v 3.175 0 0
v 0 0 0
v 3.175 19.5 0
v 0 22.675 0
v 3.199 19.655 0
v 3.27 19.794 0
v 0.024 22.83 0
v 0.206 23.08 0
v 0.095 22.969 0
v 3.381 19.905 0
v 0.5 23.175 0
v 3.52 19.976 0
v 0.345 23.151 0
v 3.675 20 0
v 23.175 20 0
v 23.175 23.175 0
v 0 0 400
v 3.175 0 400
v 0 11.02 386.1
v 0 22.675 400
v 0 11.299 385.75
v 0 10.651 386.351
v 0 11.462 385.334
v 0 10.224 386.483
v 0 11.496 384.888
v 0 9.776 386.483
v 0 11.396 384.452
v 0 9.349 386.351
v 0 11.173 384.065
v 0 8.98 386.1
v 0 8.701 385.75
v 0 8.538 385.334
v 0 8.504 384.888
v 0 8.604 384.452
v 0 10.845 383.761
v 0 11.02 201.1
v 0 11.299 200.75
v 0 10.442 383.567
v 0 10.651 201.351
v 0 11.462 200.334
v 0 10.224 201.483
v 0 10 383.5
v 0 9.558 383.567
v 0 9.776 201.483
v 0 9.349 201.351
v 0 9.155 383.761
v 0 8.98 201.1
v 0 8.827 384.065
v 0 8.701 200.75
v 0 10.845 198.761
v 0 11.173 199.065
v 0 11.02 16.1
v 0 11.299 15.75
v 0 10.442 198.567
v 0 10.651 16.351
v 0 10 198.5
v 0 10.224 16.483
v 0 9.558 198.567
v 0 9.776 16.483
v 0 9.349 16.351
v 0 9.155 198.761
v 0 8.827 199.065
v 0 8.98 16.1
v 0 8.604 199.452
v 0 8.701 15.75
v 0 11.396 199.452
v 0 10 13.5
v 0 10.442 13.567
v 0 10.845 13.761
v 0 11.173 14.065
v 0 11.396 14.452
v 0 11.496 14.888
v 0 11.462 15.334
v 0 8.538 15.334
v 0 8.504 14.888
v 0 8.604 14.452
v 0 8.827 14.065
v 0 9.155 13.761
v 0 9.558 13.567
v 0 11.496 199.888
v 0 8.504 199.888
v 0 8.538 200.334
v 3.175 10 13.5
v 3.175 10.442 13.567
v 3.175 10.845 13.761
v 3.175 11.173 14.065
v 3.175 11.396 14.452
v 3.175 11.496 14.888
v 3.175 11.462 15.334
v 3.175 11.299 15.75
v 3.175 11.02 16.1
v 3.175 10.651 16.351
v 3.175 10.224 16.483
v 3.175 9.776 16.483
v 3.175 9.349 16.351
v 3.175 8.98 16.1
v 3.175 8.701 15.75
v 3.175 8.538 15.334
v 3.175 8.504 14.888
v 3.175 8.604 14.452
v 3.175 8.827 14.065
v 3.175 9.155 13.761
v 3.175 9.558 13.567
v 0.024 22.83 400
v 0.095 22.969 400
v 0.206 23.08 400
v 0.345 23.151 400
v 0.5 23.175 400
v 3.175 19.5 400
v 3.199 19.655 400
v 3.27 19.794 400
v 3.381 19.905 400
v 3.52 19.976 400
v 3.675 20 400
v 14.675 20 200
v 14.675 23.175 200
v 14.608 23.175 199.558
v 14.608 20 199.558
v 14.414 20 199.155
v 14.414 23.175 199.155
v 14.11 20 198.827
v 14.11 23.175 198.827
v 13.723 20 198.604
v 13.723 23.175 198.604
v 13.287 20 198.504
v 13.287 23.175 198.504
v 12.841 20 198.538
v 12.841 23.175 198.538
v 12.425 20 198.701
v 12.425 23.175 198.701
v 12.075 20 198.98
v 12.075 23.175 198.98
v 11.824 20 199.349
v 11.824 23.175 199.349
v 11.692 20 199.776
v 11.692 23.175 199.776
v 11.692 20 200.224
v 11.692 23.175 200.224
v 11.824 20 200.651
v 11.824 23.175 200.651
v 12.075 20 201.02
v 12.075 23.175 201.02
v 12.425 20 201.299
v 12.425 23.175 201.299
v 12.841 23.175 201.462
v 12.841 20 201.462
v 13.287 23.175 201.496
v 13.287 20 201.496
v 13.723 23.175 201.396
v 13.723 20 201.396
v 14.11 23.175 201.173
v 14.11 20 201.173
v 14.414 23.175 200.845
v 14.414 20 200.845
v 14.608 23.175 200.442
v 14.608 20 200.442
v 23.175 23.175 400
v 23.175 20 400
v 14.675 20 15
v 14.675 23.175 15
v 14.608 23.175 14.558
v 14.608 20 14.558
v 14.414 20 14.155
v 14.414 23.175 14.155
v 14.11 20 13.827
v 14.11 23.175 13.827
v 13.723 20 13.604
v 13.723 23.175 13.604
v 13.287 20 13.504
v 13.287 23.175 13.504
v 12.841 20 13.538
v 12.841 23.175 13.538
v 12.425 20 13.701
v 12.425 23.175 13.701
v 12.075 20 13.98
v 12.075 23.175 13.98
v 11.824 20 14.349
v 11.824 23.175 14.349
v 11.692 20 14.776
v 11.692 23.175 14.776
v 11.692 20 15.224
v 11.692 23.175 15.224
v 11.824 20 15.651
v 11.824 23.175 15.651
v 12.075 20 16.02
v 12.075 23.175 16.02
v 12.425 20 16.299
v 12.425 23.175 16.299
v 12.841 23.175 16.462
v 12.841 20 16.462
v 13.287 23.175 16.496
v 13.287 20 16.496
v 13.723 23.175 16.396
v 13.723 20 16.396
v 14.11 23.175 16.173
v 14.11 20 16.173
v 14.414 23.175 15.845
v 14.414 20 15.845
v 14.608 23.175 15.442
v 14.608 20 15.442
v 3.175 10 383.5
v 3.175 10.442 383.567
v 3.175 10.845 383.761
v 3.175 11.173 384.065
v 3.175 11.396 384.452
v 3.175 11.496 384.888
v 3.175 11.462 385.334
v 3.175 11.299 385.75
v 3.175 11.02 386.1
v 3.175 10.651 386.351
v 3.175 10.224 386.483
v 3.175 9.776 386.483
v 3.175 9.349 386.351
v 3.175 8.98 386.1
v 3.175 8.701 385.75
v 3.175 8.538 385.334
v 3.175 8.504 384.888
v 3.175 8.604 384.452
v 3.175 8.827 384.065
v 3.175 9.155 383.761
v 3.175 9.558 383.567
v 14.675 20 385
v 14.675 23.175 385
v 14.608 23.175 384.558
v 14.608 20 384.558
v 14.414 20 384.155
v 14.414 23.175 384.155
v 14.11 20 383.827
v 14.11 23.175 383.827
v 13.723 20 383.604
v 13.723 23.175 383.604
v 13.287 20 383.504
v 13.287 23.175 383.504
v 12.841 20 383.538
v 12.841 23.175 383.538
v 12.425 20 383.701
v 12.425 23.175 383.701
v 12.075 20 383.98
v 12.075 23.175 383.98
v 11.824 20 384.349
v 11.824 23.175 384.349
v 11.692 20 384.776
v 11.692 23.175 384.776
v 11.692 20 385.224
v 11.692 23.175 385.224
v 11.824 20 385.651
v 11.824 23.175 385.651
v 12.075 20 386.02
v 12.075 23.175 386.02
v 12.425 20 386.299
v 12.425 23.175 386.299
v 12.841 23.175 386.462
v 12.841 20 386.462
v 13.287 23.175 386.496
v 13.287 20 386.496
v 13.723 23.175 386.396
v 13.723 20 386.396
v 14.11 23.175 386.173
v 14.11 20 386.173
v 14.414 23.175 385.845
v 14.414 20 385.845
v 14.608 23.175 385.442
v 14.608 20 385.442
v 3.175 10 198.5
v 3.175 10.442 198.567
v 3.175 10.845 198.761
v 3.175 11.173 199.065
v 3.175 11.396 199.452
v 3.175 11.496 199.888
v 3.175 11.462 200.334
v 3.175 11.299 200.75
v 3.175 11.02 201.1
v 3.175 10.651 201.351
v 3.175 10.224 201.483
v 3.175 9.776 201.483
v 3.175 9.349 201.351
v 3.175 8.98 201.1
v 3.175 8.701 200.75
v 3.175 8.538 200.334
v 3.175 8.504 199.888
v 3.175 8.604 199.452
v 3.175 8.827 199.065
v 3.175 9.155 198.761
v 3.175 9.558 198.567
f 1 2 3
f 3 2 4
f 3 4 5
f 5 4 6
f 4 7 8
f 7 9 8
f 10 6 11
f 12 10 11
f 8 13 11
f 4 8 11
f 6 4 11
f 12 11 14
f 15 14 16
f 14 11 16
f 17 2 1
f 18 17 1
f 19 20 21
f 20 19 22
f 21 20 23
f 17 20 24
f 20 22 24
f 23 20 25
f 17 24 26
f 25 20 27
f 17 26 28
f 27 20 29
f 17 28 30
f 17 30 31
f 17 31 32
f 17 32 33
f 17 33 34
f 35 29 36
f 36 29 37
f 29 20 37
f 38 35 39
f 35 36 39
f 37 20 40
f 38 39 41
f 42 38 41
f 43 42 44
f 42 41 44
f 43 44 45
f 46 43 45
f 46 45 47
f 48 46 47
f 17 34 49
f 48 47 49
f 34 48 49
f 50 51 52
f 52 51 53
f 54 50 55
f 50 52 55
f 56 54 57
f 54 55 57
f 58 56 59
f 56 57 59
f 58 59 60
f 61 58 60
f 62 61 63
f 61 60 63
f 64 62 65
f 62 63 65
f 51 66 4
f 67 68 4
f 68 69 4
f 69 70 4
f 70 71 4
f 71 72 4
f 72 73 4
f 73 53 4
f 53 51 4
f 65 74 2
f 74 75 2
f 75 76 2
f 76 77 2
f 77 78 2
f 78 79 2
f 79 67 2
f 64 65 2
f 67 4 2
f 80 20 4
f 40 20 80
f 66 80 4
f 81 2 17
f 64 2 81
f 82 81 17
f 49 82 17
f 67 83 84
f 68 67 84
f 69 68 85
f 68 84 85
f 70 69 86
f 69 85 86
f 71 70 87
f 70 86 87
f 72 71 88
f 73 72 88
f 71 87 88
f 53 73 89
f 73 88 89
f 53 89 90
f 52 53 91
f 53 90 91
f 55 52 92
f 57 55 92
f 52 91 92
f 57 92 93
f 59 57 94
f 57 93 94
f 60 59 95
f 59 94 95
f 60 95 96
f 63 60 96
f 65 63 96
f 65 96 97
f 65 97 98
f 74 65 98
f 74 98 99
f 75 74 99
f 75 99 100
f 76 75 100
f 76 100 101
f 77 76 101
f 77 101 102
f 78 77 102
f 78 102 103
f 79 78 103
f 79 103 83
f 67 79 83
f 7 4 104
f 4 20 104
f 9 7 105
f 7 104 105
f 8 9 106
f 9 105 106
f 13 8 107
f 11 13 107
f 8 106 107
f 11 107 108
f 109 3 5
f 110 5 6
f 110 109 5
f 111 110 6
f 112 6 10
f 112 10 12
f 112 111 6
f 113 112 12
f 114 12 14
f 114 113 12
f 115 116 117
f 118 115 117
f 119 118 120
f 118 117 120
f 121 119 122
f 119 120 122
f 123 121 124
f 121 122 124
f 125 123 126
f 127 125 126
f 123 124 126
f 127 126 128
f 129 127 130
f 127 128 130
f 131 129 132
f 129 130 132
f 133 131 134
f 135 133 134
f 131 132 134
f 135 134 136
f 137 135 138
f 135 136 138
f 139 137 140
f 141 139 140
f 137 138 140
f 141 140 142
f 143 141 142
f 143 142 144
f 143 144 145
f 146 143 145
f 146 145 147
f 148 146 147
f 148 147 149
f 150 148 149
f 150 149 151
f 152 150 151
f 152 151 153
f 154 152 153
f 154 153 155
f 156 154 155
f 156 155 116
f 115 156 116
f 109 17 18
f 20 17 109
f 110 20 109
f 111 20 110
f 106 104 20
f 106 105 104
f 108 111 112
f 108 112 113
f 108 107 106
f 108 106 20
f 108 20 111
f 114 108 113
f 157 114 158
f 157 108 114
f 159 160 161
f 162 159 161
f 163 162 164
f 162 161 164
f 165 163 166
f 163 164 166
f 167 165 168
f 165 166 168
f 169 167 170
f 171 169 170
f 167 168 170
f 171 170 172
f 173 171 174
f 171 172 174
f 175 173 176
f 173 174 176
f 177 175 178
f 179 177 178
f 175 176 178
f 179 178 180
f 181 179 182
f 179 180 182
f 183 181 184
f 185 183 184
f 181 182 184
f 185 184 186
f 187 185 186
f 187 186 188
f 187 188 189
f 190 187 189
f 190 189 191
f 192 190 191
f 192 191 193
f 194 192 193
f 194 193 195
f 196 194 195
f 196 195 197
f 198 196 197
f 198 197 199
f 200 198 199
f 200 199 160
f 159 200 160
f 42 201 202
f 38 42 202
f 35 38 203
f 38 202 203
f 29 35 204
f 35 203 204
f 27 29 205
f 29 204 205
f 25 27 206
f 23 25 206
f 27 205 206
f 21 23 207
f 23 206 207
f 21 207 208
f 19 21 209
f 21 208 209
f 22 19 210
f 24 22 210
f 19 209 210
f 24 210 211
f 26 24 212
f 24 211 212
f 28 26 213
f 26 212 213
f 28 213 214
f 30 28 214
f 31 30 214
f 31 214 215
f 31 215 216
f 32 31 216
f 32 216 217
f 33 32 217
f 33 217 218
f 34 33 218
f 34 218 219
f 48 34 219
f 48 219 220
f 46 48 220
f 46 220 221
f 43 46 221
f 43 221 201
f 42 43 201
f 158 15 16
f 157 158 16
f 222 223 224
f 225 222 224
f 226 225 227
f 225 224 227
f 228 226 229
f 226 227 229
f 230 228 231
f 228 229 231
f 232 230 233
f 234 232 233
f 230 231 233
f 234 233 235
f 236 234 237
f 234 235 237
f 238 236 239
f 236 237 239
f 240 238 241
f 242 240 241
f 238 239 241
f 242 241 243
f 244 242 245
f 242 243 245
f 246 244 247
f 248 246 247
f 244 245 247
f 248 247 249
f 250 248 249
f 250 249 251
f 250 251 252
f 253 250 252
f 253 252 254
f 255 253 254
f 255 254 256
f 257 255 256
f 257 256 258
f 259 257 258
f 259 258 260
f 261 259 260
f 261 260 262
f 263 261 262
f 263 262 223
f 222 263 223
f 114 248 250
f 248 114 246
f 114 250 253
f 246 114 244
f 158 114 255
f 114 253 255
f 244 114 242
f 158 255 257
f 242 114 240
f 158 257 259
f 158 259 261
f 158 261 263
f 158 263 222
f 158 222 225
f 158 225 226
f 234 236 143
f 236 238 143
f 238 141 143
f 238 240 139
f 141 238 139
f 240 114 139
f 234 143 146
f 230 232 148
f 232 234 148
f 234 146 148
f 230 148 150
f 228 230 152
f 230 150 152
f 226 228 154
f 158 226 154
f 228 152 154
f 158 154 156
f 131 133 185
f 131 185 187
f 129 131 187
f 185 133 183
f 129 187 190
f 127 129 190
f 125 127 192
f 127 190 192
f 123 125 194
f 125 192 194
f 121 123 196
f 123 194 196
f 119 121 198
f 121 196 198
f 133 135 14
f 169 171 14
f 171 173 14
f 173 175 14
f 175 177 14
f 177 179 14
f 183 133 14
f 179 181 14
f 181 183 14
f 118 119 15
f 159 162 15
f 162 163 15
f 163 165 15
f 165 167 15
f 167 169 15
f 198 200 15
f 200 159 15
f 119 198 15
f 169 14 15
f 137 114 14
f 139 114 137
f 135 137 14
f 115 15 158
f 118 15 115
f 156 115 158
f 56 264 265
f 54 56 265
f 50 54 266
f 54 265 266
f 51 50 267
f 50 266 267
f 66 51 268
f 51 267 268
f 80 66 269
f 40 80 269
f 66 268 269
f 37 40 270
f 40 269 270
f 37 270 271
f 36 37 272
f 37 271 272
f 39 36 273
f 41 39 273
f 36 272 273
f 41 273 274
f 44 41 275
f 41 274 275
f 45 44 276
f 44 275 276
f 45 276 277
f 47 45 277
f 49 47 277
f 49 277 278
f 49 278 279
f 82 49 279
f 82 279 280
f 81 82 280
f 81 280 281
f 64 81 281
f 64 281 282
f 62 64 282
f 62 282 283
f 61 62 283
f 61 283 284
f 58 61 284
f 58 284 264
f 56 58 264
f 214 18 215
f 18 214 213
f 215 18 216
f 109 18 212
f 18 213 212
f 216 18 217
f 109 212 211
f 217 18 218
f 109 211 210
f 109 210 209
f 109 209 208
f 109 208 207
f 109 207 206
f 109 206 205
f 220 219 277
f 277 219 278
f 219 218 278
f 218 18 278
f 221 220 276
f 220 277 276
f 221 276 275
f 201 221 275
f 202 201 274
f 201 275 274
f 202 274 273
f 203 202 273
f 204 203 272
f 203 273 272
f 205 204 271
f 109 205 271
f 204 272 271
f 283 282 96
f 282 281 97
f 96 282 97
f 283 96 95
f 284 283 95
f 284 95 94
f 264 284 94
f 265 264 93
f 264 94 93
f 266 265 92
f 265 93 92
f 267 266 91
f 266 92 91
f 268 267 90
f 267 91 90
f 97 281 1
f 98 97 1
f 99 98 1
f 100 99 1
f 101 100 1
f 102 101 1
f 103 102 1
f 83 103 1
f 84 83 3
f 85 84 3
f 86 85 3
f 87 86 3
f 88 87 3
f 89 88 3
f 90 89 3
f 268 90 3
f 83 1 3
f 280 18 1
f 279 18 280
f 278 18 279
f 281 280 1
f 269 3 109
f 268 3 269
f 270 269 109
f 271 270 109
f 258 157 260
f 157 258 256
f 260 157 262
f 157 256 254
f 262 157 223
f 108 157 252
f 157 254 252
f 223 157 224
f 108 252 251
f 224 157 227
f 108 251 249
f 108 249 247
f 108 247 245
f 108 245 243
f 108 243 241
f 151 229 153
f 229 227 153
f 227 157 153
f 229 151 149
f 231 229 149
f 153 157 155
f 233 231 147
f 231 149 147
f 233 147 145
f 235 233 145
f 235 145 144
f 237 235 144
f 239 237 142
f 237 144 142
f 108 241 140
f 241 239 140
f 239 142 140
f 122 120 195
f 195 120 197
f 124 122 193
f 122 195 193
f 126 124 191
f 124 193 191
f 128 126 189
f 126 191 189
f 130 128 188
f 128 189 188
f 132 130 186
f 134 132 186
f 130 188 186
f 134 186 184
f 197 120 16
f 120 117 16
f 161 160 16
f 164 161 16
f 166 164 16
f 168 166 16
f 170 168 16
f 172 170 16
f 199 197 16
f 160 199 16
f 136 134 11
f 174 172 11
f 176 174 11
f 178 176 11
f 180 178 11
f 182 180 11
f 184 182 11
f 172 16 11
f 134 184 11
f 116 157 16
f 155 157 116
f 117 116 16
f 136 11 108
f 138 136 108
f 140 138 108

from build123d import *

# Parameters (mm, degrees)
SKETCH1_W           = 3.175
SKETCH1_H           = 20
BOSS_EXTRUDE1_DEPTH = 400
SKETCH3_R           = 1.5
CUT_EXTRUDE1_DEPTH  = 400
SKETCH4_R           = 1.5
CUT_EXTRUDE2_DEPTH  = 400
FILLET1_R           = 0.5


with BuildPart() as part:
    # Sketch1 → Boss-Extrude1 (new body)
    with BuildSketch(Plane.XY):
        with Locations((1.5875, 10)):
            Rectangle(SKETCH1_W, SKETCH1_H)
        Polygon((0, 23.175), (0, 20), (3.175, 20), (23.175, 20), (23.175, 23.175), align=None)
    extrude(amount=BOSS_EXTRUDE1_DEPTH)

    # Sketch3 → Cut-Extrude1 (cut)
    with BuildSketch(Plane(origin=(0, 23.175, 0), x_dir=(1, 0, 0), z_dir=(0, 1, 0))):
        with Locations((13.175, -200)):
            Circle(SKETCH3_R)
        with Locations((13.175, -385)):
            Circle(SKETCH3_R)
        with Locations((13.175, -15)):
            Circle(SKETCH3_R)
    extrude(amount=-CUT_EXTRUDE1_DEPTH, mode=Mode.SUBTRACT)

    # Sketch4 → Cut-Extrude2 (cut)
    with BuildSketch(Plane(origin=(3.175, 0, 0), x_dir=(0, 0, -1), z_dir=(1, 0, 0))):
        with Locations((-385, 10)):
            Circle(SKETCH4_R)
        with Locations((-200, 10)):
            Circle(SKETCH4_R)
        with Locations((-15, 10)):
            Circle(SKETCH4_R)
    extrude(amount=-CUT_EXTRUDE2_DEPTH, mode=Mode.SUBTRACT)

    # Fillet1
    fillet1_edges = [part.edges().sort_by_distance(p)[0] for p in [
        (0, 23.175, 200),
        (3.175, 20, 200),
    ]]
    fillet(fillet1_edges, radius=FILLET1_R)


solid = part.part
